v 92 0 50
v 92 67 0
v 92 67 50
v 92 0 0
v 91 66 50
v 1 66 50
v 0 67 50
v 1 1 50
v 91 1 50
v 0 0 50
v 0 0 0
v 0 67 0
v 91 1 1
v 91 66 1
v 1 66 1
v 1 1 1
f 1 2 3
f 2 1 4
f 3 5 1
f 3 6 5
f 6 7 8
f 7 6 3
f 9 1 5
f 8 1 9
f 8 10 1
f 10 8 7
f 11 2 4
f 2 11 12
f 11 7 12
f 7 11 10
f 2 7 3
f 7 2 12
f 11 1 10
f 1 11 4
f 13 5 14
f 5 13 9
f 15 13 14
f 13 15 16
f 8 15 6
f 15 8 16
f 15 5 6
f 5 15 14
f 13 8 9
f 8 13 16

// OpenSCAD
wall=1;
// note - bottom was too thin and it tore during print. shore it up before printing again
difference() {
    cube([90+wall*2,65+wall*2,50]);
    translate([wall,wall,wall]) cube([90,65,50+wall]);
}
